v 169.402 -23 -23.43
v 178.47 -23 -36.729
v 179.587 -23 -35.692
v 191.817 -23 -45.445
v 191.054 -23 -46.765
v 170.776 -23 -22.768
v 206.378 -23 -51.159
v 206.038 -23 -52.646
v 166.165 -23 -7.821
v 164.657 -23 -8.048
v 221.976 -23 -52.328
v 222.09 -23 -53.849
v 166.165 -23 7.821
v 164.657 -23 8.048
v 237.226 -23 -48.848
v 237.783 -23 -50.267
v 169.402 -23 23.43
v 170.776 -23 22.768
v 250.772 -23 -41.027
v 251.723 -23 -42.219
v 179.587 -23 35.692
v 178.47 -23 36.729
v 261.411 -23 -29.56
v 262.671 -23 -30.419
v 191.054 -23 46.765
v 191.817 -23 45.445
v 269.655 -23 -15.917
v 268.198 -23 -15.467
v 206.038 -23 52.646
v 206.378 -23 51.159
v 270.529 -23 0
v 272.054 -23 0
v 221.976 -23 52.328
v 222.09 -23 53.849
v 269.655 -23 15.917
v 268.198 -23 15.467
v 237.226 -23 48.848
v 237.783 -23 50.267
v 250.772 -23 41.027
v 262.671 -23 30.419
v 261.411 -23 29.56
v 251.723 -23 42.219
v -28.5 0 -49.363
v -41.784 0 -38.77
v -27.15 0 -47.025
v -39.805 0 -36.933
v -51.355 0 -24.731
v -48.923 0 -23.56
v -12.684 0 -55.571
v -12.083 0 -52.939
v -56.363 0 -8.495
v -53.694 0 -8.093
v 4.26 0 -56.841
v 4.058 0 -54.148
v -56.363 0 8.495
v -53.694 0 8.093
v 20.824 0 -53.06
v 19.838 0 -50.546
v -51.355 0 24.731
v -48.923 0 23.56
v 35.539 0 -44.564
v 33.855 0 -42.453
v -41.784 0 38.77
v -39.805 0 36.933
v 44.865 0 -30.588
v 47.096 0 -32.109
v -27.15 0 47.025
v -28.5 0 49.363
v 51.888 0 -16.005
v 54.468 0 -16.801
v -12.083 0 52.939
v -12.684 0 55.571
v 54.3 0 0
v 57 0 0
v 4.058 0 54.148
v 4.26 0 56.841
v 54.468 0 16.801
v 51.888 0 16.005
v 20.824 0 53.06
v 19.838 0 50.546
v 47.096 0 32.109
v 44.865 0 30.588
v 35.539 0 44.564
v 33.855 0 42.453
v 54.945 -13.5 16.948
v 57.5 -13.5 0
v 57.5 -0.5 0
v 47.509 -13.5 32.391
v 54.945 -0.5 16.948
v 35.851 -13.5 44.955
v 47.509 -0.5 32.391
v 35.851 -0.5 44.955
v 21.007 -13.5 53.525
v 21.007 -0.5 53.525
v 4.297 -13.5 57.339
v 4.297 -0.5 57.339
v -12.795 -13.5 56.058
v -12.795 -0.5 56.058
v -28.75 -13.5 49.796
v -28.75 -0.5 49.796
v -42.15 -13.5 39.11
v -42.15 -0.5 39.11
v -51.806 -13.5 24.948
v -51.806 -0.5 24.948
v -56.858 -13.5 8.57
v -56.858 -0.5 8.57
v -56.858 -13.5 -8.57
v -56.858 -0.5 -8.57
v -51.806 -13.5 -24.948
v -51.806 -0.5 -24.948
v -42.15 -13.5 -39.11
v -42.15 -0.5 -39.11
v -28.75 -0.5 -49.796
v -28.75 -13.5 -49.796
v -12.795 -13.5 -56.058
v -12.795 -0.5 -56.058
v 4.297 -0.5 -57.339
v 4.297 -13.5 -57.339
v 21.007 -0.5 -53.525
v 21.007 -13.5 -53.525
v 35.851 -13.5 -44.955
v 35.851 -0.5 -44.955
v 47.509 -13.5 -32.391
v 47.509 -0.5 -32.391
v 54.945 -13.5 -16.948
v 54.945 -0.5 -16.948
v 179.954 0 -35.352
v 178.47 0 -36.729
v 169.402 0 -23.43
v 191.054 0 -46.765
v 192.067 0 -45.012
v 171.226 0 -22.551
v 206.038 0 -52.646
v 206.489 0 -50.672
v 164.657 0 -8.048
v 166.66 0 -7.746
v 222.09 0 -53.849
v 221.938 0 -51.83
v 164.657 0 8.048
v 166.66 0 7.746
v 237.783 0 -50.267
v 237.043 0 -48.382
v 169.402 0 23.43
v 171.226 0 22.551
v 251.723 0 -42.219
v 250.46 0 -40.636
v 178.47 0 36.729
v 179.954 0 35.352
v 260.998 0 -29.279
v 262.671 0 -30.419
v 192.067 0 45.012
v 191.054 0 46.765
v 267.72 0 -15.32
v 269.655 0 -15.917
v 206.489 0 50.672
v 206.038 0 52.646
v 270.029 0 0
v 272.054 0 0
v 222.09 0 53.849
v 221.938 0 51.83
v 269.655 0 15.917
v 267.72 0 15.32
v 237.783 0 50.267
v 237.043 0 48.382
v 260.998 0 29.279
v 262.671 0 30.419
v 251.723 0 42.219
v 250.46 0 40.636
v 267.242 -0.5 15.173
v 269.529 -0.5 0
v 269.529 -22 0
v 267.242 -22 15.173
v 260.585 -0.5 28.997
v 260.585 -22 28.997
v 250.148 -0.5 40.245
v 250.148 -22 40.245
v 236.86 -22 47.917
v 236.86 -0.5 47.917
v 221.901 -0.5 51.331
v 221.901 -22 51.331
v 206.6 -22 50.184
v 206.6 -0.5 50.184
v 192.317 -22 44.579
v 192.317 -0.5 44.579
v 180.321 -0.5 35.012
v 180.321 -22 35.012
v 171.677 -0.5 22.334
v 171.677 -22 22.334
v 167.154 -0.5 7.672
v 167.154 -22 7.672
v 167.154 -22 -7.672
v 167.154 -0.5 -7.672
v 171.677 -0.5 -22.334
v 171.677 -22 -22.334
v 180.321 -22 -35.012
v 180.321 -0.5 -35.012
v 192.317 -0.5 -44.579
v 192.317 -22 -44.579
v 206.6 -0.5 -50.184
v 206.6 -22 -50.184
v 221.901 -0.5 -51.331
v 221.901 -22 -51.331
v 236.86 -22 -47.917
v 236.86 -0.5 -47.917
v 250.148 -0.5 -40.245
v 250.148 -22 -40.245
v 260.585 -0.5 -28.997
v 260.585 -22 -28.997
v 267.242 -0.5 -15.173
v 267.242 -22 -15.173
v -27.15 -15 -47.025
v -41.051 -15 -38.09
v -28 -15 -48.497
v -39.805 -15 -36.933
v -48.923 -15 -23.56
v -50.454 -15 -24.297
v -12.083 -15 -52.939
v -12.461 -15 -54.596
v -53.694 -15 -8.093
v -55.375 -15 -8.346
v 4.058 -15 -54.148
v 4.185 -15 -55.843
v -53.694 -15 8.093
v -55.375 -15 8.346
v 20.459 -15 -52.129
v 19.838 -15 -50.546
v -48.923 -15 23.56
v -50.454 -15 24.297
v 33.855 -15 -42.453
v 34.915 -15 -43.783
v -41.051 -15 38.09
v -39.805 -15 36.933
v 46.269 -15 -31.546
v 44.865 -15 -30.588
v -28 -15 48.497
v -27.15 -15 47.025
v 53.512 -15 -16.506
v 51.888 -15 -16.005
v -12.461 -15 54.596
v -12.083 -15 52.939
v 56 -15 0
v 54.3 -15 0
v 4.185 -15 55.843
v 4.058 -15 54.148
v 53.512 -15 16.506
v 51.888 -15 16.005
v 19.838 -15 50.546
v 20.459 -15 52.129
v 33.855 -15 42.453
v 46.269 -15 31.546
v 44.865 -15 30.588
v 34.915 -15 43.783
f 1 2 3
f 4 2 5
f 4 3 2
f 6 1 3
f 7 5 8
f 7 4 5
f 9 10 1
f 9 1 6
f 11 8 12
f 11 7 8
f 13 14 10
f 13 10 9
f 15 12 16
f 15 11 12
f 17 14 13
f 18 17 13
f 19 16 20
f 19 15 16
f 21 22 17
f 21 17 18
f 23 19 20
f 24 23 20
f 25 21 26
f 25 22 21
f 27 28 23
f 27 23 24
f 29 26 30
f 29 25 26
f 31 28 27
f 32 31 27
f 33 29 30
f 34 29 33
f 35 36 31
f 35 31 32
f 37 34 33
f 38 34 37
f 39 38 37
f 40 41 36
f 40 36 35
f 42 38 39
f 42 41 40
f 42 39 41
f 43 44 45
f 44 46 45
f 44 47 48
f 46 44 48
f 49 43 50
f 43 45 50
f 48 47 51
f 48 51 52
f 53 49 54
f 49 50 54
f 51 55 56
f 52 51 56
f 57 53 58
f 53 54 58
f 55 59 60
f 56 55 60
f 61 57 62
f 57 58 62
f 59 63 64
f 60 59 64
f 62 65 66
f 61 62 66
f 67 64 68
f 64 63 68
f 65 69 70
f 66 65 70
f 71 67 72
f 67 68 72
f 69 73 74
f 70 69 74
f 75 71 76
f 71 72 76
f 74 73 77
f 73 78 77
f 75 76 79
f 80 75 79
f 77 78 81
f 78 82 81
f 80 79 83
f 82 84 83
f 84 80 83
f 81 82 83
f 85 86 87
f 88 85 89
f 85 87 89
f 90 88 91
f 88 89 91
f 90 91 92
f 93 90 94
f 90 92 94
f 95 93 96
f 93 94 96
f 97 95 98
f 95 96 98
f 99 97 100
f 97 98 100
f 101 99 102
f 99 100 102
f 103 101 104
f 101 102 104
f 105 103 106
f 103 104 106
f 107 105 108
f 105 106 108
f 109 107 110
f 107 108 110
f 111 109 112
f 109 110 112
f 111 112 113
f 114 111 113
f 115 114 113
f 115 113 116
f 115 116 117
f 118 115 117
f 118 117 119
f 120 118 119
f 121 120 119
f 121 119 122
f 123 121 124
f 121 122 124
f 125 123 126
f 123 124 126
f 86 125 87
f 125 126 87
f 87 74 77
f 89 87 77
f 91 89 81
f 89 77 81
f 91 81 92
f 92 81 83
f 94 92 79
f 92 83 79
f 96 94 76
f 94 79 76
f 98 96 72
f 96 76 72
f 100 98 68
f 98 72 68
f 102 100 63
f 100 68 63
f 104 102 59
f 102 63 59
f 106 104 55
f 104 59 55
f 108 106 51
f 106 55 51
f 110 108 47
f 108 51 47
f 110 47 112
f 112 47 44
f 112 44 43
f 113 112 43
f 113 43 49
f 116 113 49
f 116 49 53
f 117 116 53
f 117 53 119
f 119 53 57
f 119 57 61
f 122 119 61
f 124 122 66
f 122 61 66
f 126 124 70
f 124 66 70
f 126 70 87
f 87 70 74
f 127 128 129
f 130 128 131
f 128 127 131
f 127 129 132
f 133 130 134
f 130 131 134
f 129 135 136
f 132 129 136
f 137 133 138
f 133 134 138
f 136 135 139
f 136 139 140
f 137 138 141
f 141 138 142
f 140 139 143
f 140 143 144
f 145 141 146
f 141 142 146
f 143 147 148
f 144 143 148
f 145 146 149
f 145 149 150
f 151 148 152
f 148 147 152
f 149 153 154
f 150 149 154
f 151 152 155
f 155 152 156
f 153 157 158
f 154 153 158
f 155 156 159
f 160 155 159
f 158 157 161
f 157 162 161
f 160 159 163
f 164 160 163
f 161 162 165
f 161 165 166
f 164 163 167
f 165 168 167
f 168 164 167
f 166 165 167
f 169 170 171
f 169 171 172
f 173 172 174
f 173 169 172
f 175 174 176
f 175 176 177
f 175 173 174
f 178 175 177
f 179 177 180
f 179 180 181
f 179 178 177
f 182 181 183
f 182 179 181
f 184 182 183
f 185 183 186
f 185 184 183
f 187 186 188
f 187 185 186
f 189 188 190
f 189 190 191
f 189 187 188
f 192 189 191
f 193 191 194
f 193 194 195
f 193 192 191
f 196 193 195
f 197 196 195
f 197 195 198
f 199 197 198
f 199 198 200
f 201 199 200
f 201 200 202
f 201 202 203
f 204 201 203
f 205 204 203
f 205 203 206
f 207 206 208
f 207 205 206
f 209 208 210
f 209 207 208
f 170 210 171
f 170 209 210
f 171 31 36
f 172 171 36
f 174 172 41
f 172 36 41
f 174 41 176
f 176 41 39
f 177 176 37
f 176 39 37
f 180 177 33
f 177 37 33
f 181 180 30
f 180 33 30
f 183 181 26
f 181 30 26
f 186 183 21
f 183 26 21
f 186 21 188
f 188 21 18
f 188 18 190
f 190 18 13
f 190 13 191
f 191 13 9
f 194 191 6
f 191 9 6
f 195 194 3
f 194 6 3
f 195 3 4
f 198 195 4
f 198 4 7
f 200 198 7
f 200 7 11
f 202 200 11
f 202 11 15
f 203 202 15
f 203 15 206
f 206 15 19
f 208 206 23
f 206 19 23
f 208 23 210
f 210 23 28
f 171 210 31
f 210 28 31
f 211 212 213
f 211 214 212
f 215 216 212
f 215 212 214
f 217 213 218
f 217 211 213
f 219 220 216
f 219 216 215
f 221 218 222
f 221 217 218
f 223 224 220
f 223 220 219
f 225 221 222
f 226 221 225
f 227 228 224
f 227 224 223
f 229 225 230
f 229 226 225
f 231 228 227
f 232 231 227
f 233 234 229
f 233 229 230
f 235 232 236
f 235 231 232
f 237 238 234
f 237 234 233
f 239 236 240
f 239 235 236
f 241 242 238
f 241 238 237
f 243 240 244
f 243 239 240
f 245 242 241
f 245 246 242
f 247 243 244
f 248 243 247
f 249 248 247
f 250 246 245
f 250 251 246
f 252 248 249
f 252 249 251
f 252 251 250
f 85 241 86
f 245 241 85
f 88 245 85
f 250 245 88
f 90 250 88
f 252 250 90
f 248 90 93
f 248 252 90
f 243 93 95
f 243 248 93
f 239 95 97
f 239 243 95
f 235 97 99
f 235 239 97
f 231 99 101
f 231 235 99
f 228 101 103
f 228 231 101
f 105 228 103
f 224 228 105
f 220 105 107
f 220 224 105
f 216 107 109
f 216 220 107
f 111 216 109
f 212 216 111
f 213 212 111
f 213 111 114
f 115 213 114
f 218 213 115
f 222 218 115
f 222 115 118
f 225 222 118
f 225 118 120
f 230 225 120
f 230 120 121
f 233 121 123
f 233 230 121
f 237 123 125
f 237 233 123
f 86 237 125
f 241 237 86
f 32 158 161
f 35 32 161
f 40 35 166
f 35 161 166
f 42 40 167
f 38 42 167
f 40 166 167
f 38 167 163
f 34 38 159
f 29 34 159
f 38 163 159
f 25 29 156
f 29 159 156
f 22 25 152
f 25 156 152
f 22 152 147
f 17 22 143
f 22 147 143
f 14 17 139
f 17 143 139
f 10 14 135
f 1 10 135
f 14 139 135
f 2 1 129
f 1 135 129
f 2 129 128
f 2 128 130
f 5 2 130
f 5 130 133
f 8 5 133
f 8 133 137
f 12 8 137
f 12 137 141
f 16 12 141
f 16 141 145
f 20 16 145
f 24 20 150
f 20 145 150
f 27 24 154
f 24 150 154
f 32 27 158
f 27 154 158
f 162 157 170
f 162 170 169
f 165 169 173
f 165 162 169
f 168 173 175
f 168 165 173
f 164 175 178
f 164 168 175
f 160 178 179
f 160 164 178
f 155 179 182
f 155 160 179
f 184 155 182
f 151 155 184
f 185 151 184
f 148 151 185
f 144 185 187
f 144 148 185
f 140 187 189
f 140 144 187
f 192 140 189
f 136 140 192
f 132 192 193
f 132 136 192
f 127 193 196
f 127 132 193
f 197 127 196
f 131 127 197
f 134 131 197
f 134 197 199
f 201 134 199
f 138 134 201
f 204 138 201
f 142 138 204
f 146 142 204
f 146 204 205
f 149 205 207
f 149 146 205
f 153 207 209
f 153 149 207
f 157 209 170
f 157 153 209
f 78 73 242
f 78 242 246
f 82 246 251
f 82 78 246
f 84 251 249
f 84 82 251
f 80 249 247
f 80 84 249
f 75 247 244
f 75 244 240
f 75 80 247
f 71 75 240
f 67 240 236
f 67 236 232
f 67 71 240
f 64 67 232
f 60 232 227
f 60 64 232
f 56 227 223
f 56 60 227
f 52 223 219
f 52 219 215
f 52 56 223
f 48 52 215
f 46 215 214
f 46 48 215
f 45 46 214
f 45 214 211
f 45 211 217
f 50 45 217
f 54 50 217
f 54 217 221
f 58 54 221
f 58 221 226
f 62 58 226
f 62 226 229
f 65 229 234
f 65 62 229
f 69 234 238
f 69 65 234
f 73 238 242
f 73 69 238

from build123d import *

# Parameters (mm, degrees)
F1_R     = 54
F1_R_2   = 51.475
F2_DEPTH = 23
F3_SIZE  = 1
F4_SIZE  = 0.5
F0_R     = 57.5
F0_R_2   = 54.3
F5_DEPTH = 15
F6_SIZE  = 1.5
F7_SIZE  = 0.5


with BuildPart() as f2:
    # F1 (on Front) → F2 (new body)
    with BuildSketch(Plane.XZ):
        with Locations((218.054354, 0)):
            Circle(F1_R)
        with Locations((218.054354, 0)):
            Circle(F1_R_2, mode=Mode.SUBTRACT)
    extrude(amount=F2_DEPTH)

    # F3
    f3_edges = [f2.edges().sort_by_distance(p)[0] for p in [
        (166.579354, -23, 0),
    ]]
    chamfer(f3_edges, length=F3_SIZE)

    # F4
    f4_edges = [f2.edges().sort_by_distance(p)[0] for p in [
        (166.579354, 0, 0),
    ]]
    chamfer(f4_edges, length=F4_SIZE)


with BuildPart() as f5:
    # F0 (on Front) → F5 (new body)
    with BuildSketch(Plane.XZ):
        Circle(F0_R)
        Circle(F0_R_2, mode=Mode.SUBTRACT)
    extrude(amount=F5_DEPTH)

    # F6
    f6_edges = [f5.edges().sort_by_distance(p)[0] for p in [
        (-57.5, -15, 0),
    ]]
    chamfer(f6_edges, length=F6_SIZE)

    # F7
    f7_edges = [f5.edges().sort_by_distance(p)[0] for p in [
        (-57.5, 0, 0),
    ]]
    chamfer(f7_edges, length=F7_SIZE)


solid = Compound([f2.part, f5.part])
